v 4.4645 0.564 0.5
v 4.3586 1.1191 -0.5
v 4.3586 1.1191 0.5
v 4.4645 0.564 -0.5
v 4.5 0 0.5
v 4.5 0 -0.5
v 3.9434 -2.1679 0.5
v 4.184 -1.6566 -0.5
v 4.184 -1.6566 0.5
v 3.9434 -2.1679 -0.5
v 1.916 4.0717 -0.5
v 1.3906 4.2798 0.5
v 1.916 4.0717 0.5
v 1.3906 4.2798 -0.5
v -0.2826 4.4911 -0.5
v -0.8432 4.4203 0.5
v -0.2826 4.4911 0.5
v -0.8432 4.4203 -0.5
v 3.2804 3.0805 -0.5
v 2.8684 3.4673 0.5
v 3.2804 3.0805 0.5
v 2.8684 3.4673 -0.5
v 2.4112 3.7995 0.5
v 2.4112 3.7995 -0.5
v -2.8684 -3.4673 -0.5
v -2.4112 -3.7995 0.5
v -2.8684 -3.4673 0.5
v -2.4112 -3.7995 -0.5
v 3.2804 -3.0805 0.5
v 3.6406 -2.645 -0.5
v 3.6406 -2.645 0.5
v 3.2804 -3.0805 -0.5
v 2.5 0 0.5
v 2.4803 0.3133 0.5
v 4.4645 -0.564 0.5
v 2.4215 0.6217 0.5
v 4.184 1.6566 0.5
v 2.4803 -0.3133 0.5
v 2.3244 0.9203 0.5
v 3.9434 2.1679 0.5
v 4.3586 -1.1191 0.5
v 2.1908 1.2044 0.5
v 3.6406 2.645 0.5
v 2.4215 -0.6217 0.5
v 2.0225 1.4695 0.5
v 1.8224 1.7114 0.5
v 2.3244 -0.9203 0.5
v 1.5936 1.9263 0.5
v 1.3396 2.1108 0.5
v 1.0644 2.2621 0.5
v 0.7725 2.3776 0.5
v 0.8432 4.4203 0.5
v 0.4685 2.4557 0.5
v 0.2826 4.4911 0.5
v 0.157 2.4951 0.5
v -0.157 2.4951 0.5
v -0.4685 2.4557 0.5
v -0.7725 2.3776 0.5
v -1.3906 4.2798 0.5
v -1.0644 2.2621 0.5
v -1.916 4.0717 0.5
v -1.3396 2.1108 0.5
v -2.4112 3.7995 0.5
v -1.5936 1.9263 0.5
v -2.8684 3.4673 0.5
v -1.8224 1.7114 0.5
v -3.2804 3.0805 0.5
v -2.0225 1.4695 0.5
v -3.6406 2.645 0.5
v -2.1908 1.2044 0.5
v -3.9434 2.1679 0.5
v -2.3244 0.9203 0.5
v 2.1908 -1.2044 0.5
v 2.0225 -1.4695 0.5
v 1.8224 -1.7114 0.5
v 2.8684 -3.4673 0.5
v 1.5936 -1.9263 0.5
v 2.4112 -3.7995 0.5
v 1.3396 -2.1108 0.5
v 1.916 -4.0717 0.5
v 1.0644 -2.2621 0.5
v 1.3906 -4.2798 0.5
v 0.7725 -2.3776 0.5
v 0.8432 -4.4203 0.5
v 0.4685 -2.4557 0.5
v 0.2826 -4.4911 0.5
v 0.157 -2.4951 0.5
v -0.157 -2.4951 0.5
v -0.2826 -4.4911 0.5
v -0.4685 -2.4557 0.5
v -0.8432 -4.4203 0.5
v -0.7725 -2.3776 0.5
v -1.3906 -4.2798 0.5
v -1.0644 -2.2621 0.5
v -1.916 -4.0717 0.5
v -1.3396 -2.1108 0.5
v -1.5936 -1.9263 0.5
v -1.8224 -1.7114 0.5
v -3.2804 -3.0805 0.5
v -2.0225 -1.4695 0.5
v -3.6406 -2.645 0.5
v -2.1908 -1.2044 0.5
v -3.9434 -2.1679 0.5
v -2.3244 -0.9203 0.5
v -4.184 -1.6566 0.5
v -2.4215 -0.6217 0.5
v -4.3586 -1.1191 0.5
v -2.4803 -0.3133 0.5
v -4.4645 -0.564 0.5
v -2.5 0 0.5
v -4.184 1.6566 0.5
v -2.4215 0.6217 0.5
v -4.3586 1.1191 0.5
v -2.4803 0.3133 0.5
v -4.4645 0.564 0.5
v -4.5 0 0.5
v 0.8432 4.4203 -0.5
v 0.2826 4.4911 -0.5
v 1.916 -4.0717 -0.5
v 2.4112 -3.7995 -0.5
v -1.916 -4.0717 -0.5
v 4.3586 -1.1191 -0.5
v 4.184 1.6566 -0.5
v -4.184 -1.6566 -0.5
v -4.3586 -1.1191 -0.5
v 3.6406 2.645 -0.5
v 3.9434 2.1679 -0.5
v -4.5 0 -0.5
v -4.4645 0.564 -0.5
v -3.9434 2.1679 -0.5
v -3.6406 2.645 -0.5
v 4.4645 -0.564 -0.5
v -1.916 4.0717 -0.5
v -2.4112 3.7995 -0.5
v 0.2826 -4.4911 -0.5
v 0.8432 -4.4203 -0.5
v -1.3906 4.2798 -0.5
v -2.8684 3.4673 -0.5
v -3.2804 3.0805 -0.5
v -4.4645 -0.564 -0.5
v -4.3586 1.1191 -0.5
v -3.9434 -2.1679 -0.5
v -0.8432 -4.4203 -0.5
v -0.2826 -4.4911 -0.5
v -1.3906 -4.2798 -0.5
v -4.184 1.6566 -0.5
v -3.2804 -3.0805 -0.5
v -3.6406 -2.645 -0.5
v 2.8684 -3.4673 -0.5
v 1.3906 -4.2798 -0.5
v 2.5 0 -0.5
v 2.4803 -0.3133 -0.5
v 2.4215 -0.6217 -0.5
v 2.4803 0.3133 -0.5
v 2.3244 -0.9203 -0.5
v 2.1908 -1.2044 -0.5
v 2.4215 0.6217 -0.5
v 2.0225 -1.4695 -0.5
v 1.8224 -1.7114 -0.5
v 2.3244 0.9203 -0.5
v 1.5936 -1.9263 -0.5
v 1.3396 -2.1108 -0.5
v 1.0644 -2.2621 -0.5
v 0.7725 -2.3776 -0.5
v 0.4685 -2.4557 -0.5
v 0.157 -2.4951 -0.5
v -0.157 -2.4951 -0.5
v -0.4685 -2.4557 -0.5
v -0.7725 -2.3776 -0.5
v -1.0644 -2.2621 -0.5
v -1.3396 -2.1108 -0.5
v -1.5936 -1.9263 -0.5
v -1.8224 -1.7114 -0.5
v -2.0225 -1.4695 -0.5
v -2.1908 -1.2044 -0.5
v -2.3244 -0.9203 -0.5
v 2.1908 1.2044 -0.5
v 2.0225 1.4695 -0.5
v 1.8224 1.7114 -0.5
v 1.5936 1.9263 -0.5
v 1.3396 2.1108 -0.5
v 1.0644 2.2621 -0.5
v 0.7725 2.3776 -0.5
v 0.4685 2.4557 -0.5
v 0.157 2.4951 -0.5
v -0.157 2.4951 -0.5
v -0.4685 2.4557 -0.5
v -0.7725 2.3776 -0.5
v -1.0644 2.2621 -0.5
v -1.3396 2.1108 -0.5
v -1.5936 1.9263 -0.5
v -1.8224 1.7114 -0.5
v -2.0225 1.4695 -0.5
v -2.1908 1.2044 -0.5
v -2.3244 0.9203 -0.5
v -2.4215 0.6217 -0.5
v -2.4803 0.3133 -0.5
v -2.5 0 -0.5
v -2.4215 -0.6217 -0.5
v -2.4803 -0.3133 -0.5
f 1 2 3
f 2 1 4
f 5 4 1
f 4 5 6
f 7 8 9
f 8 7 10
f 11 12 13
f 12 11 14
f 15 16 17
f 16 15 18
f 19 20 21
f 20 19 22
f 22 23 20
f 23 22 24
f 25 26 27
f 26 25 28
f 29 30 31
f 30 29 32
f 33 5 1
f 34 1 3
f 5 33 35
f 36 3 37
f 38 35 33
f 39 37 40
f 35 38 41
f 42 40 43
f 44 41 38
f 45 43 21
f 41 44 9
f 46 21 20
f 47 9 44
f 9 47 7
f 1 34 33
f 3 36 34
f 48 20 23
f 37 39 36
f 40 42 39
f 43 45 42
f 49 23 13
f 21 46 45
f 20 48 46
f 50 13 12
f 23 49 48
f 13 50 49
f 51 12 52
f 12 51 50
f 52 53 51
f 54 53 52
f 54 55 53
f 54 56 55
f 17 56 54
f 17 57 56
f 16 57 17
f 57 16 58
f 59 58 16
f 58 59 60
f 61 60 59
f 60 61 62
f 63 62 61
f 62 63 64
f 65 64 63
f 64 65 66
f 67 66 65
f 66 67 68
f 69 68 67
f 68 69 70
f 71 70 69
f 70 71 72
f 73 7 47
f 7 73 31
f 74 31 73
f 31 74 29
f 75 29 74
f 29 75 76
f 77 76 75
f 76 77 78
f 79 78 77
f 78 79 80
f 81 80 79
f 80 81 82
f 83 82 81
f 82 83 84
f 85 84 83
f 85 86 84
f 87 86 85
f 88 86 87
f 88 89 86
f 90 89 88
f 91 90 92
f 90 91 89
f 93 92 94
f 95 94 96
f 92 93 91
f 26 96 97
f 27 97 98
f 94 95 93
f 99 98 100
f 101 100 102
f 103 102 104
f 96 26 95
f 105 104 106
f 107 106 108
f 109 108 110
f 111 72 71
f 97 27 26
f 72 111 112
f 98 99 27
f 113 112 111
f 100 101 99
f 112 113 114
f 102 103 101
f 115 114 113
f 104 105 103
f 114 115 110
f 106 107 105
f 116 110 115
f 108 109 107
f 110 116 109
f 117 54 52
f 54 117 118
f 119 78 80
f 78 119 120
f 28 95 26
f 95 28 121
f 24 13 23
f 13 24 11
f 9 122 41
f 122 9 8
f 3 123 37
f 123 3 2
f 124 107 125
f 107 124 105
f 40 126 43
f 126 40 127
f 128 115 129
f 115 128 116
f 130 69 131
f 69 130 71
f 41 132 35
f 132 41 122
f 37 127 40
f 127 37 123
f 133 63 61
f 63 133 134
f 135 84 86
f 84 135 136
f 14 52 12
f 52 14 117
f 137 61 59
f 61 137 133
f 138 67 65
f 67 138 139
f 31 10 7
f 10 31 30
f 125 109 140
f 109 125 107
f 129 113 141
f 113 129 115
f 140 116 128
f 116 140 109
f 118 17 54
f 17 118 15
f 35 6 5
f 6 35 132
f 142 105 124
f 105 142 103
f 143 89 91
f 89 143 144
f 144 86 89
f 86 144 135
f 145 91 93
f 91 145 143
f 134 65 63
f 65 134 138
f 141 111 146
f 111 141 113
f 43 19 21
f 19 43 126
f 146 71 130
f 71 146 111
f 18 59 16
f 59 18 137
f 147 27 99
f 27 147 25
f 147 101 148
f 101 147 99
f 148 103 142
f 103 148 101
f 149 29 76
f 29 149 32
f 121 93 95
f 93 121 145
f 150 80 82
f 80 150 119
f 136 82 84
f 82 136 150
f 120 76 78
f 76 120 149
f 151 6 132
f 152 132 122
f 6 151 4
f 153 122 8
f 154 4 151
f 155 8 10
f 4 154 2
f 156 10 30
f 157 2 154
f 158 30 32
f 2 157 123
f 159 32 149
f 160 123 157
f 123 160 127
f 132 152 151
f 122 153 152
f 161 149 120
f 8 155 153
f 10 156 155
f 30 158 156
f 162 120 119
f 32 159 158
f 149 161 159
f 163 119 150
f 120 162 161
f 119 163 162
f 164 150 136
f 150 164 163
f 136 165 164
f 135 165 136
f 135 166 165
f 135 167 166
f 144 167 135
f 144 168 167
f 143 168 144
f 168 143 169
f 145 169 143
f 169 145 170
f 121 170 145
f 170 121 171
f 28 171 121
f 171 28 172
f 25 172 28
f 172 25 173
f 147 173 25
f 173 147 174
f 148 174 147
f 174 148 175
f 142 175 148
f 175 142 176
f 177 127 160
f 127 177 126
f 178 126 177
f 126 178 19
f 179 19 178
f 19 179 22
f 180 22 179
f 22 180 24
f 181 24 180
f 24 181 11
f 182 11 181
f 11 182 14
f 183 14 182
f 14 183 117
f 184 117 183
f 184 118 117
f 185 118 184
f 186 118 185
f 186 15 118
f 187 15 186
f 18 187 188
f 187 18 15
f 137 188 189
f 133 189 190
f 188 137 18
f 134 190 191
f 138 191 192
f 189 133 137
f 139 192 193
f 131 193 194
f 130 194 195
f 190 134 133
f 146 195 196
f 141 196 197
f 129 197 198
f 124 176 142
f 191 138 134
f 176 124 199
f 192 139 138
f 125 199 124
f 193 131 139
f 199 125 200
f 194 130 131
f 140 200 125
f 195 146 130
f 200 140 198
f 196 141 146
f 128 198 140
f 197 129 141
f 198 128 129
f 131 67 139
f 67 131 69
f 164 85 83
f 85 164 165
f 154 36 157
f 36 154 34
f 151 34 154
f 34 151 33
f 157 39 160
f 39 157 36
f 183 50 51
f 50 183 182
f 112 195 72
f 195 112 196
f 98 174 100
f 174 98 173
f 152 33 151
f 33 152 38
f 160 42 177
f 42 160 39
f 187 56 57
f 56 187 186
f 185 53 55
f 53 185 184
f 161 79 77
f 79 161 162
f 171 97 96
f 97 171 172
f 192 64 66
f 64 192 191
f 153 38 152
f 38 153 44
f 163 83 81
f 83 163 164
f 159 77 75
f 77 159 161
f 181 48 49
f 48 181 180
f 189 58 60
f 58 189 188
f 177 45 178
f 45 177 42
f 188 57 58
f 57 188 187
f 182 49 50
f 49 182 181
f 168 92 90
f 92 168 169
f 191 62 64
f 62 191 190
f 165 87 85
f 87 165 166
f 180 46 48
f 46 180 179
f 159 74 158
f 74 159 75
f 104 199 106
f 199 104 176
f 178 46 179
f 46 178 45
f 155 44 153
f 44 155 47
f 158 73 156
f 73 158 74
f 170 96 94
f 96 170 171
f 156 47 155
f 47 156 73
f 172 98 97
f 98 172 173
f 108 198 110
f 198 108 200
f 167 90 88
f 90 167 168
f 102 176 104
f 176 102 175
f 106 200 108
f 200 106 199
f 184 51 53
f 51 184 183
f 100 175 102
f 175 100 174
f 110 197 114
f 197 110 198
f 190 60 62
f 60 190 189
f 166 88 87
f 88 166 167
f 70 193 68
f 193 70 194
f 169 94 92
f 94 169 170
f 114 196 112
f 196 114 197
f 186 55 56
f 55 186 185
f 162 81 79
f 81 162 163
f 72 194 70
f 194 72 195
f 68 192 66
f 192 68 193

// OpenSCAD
$fn = 50;


difference() {
	union() {
		translate(v = [0, 0, -0.5000000000]) {
			cylinder(h = 1, r = 4.5000000000);
		}
	}
	union() {
		translate(v = [0, 0, -100.0000000000]) {
			cylinder(h = 200, r = 2.5000000000);
		}
	}
}
